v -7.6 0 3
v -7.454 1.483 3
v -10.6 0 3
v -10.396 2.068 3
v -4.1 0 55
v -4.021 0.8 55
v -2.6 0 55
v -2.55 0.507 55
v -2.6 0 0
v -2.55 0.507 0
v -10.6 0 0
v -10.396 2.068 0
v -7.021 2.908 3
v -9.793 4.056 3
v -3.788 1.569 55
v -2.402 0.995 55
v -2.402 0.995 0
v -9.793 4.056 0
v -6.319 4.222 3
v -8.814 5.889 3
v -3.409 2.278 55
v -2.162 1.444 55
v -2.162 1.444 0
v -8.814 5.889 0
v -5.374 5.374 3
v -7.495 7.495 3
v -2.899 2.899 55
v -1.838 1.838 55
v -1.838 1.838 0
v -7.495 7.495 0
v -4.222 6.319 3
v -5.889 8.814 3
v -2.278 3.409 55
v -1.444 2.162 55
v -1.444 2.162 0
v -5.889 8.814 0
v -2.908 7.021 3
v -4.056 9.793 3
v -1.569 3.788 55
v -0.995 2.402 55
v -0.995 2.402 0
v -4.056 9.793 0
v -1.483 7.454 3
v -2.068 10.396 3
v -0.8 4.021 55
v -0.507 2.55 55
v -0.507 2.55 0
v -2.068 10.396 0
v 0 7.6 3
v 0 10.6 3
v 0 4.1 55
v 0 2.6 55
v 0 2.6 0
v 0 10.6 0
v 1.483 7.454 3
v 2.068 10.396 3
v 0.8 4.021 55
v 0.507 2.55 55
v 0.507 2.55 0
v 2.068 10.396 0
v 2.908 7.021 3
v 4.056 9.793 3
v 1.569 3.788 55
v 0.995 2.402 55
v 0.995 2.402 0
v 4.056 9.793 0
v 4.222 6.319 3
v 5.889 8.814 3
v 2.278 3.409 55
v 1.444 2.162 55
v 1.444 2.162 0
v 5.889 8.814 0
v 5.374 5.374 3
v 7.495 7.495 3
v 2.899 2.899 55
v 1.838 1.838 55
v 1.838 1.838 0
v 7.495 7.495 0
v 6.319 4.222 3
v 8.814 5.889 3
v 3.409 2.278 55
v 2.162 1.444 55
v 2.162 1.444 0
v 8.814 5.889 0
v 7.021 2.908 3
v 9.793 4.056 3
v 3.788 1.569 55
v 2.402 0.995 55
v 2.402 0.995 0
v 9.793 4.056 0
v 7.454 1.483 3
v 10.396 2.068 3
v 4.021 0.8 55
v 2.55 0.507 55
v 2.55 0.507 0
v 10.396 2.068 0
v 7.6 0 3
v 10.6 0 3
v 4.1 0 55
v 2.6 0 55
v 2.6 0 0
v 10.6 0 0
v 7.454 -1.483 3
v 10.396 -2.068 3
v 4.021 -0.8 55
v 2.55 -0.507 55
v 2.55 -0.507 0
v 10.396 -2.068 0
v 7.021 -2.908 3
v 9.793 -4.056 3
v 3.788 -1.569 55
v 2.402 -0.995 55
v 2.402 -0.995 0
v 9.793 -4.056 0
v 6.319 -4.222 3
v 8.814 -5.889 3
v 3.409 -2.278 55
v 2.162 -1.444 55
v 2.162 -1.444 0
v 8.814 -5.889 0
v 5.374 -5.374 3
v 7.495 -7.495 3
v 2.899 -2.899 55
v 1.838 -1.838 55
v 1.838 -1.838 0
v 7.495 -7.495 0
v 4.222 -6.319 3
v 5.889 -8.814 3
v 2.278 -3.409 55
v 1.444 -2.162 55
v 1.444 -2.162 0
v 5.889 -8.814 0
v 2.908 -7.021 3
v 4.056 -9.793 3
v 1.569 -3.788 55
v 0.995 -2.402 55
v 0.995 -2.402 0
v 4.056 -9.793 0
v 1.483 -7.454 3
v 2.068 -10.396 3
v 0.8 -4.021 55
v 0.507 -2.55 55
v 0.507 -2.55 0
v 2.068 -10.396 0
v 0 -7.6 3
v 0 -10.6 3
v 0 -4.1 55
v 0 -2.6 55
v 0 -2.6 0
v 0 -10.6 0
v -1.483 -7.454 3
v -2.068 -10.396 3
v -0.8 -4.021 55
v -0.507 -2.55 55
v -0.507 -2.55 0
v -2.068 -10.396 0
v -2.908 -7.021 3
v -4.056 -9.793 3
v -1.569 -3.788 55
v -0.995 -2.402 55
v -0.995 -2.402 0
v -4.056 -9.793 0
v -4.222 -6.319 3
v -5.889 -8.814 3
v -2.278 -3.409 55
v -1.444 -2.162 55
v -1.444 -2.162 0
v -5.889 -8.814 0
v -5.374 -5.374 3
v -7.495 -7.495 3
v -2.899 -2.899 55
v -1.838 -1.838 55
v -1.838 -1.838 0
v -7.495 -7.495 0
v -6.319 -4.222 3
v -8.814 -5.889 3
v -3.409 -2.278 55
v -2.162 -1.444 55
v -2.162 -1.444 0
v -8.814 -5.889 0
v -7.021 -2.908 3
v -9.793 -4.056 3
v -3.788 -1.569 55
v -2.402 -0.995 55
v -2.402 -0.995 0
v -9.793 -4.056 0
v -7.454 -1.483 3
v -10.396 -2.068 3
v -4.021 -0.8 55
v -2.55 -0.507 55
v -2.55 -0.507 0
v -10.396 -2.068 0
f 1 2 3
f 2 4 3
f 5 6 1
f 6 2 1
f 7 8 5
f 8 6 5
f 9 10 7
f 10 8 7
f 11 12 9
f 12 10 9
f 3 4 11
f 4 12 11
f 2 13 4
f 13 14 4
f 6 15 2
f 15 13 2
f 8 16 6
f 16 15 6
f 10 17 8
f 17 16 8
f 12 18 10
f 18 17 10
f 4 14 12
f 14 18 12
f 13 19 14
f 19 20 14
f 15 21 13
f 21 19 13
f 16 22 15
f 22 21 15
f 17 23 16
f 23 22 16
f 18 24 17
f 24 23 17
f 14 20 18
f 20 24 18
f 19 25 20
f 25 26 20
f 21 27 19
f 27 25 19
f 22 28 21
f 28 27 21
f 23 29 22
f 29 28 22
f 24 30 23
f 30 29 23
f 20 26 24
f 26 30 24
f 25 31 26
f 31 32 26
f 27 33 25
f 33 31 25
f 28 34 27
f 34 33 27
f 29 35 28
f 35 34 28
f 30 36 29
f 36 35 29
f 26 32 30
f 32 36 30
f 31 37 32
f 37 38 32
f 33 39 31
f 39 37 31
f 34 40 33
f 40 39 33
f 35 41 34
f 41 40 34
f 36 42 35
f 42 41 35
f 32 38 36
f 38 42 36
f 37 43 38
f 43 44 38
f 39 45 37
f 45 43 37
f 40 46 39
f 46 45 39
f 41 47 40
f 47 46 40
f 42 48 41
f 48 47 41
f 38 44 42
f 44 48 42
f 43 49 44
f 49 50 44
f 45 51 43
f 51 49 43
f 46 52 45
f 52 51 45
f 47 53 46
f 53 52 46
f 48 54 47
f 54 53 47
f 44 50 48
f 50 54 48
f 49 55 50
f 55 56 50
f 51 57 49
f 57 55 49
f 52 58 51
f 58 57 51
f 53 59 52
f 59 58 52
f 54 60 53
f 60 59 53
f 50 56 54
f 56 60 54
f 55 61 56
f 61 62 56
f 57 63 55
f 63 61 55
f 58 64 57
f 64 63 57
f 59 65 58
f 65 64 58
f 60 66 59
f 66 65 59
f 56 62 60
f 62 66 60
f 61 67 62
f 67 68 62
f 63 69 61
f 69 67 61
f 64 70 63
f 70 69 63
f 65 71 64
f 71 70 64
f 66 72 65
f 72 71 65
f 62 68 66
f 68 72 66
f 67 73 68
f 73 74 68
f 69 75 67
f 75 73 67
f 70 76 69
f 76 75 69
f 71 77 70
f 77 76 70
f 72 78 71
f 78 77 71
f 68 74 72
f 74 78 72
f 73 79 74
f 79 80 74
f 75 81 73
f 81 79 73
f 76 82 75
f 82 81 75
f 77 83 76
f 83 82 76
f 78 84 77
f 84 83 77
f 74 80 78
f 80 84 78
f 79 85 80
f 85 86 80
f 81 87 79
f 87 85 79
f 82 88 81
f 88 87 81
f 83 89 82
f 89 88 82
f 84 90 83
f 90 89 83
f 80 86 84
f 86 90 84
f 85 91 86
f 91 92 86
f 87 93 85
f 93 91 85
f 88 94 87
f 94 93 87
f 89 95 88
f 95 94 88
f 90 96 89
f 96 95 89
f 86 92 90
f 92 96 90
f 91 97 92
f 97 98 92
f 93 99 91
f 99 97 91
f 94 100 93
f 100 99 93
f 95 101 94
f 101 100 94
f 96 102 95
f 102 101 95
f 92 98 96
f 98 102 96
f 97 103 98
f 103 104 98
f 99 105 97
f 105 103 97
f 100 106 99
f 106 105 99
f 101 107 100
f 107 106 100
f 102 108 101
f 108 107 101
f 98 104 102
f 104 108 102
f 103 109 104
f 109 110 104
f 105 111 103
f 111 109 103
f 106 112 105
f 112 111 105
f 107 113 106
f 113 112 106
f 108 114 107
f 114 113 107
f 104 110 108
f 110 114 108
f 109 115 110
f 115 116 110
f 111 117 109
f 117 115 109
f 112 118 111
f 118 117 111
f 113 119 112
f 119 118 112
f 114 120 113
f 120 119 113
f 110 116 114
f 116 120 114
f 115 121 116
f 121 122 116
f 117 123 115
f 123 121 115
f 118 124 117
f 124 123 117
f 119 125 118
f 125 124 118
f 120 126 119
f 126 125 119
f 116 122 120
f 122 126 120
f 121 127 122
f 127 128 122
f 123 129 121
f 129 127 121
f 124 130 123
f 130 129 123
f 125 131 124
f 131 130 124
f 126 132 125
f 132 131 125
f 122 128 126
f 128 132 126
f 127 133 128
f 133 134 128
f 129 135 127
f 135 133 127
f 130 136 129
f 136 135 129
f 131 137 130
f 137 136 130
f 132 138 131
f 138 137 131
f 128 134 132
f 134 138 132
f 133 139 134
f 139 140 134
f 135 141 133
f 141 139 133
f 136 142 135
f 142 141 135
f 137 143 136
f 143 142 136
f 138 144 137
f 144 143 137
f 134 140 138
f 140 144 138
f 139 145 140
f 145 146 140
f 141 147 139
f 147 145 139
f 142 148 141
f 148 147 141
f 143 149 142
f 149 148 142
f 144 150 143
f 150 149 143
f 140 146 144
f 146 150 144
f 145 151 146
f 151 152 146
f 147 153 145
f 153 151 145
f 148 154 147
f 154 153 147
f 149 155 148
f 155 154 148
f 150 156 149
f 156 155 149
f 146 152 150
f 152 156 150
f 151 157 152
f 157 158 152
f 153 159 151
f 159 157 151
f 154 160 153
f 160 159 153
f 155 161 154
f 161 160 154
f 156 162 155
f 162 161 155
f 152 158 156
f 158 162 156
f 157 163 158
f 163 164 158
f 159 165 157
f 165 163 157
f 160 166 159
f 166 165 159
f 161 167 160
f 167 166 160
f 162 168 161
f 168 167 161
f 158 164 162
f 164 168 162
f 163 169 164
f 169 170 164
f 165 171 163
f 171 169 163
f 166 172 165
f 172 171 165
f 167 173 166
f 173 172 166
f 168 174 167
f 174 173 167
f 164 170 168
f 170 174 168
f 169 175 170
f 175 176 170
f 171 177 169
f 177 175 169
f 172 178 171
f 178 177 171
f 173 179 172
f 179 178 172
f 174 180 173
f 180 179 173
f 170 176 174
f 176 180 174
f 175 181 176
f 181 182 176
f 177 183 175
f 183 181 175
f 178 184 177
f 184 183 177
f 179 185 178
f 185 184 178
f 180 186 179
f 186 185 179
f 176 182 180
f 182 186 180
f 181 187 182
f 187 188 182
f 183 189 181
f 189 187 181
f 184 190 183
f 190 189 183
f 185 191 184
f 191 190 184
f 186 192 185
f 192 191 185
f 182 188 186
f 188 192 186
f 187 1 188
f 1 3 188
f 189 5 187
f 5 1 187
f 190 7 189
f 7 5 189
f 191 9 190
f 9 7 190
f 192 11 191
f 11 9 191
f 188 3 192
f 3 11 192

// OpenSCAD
$fn = 32;

// ----------------------------------------------------------------------
// Profiled standoff: conical spacer, 55 mm long, bore 5.2 mm
// ----------------------------------------------------------------------

// --- parameters (mm) ---
revolve_angle = 360;      // full turn around the Z axis
profile_points = 6;       // points of the closed outline

profile = [[2.6, 0], [10.6, 0], [10.6, 3], [7.6, 3], [4.1, 55], [2.6, 55]];  // single closed polygon, 6 points, counter clockwise

// --- the one profile operation ---
rotate_extrude(angle = revolve_angle) polygon(points = profile);
